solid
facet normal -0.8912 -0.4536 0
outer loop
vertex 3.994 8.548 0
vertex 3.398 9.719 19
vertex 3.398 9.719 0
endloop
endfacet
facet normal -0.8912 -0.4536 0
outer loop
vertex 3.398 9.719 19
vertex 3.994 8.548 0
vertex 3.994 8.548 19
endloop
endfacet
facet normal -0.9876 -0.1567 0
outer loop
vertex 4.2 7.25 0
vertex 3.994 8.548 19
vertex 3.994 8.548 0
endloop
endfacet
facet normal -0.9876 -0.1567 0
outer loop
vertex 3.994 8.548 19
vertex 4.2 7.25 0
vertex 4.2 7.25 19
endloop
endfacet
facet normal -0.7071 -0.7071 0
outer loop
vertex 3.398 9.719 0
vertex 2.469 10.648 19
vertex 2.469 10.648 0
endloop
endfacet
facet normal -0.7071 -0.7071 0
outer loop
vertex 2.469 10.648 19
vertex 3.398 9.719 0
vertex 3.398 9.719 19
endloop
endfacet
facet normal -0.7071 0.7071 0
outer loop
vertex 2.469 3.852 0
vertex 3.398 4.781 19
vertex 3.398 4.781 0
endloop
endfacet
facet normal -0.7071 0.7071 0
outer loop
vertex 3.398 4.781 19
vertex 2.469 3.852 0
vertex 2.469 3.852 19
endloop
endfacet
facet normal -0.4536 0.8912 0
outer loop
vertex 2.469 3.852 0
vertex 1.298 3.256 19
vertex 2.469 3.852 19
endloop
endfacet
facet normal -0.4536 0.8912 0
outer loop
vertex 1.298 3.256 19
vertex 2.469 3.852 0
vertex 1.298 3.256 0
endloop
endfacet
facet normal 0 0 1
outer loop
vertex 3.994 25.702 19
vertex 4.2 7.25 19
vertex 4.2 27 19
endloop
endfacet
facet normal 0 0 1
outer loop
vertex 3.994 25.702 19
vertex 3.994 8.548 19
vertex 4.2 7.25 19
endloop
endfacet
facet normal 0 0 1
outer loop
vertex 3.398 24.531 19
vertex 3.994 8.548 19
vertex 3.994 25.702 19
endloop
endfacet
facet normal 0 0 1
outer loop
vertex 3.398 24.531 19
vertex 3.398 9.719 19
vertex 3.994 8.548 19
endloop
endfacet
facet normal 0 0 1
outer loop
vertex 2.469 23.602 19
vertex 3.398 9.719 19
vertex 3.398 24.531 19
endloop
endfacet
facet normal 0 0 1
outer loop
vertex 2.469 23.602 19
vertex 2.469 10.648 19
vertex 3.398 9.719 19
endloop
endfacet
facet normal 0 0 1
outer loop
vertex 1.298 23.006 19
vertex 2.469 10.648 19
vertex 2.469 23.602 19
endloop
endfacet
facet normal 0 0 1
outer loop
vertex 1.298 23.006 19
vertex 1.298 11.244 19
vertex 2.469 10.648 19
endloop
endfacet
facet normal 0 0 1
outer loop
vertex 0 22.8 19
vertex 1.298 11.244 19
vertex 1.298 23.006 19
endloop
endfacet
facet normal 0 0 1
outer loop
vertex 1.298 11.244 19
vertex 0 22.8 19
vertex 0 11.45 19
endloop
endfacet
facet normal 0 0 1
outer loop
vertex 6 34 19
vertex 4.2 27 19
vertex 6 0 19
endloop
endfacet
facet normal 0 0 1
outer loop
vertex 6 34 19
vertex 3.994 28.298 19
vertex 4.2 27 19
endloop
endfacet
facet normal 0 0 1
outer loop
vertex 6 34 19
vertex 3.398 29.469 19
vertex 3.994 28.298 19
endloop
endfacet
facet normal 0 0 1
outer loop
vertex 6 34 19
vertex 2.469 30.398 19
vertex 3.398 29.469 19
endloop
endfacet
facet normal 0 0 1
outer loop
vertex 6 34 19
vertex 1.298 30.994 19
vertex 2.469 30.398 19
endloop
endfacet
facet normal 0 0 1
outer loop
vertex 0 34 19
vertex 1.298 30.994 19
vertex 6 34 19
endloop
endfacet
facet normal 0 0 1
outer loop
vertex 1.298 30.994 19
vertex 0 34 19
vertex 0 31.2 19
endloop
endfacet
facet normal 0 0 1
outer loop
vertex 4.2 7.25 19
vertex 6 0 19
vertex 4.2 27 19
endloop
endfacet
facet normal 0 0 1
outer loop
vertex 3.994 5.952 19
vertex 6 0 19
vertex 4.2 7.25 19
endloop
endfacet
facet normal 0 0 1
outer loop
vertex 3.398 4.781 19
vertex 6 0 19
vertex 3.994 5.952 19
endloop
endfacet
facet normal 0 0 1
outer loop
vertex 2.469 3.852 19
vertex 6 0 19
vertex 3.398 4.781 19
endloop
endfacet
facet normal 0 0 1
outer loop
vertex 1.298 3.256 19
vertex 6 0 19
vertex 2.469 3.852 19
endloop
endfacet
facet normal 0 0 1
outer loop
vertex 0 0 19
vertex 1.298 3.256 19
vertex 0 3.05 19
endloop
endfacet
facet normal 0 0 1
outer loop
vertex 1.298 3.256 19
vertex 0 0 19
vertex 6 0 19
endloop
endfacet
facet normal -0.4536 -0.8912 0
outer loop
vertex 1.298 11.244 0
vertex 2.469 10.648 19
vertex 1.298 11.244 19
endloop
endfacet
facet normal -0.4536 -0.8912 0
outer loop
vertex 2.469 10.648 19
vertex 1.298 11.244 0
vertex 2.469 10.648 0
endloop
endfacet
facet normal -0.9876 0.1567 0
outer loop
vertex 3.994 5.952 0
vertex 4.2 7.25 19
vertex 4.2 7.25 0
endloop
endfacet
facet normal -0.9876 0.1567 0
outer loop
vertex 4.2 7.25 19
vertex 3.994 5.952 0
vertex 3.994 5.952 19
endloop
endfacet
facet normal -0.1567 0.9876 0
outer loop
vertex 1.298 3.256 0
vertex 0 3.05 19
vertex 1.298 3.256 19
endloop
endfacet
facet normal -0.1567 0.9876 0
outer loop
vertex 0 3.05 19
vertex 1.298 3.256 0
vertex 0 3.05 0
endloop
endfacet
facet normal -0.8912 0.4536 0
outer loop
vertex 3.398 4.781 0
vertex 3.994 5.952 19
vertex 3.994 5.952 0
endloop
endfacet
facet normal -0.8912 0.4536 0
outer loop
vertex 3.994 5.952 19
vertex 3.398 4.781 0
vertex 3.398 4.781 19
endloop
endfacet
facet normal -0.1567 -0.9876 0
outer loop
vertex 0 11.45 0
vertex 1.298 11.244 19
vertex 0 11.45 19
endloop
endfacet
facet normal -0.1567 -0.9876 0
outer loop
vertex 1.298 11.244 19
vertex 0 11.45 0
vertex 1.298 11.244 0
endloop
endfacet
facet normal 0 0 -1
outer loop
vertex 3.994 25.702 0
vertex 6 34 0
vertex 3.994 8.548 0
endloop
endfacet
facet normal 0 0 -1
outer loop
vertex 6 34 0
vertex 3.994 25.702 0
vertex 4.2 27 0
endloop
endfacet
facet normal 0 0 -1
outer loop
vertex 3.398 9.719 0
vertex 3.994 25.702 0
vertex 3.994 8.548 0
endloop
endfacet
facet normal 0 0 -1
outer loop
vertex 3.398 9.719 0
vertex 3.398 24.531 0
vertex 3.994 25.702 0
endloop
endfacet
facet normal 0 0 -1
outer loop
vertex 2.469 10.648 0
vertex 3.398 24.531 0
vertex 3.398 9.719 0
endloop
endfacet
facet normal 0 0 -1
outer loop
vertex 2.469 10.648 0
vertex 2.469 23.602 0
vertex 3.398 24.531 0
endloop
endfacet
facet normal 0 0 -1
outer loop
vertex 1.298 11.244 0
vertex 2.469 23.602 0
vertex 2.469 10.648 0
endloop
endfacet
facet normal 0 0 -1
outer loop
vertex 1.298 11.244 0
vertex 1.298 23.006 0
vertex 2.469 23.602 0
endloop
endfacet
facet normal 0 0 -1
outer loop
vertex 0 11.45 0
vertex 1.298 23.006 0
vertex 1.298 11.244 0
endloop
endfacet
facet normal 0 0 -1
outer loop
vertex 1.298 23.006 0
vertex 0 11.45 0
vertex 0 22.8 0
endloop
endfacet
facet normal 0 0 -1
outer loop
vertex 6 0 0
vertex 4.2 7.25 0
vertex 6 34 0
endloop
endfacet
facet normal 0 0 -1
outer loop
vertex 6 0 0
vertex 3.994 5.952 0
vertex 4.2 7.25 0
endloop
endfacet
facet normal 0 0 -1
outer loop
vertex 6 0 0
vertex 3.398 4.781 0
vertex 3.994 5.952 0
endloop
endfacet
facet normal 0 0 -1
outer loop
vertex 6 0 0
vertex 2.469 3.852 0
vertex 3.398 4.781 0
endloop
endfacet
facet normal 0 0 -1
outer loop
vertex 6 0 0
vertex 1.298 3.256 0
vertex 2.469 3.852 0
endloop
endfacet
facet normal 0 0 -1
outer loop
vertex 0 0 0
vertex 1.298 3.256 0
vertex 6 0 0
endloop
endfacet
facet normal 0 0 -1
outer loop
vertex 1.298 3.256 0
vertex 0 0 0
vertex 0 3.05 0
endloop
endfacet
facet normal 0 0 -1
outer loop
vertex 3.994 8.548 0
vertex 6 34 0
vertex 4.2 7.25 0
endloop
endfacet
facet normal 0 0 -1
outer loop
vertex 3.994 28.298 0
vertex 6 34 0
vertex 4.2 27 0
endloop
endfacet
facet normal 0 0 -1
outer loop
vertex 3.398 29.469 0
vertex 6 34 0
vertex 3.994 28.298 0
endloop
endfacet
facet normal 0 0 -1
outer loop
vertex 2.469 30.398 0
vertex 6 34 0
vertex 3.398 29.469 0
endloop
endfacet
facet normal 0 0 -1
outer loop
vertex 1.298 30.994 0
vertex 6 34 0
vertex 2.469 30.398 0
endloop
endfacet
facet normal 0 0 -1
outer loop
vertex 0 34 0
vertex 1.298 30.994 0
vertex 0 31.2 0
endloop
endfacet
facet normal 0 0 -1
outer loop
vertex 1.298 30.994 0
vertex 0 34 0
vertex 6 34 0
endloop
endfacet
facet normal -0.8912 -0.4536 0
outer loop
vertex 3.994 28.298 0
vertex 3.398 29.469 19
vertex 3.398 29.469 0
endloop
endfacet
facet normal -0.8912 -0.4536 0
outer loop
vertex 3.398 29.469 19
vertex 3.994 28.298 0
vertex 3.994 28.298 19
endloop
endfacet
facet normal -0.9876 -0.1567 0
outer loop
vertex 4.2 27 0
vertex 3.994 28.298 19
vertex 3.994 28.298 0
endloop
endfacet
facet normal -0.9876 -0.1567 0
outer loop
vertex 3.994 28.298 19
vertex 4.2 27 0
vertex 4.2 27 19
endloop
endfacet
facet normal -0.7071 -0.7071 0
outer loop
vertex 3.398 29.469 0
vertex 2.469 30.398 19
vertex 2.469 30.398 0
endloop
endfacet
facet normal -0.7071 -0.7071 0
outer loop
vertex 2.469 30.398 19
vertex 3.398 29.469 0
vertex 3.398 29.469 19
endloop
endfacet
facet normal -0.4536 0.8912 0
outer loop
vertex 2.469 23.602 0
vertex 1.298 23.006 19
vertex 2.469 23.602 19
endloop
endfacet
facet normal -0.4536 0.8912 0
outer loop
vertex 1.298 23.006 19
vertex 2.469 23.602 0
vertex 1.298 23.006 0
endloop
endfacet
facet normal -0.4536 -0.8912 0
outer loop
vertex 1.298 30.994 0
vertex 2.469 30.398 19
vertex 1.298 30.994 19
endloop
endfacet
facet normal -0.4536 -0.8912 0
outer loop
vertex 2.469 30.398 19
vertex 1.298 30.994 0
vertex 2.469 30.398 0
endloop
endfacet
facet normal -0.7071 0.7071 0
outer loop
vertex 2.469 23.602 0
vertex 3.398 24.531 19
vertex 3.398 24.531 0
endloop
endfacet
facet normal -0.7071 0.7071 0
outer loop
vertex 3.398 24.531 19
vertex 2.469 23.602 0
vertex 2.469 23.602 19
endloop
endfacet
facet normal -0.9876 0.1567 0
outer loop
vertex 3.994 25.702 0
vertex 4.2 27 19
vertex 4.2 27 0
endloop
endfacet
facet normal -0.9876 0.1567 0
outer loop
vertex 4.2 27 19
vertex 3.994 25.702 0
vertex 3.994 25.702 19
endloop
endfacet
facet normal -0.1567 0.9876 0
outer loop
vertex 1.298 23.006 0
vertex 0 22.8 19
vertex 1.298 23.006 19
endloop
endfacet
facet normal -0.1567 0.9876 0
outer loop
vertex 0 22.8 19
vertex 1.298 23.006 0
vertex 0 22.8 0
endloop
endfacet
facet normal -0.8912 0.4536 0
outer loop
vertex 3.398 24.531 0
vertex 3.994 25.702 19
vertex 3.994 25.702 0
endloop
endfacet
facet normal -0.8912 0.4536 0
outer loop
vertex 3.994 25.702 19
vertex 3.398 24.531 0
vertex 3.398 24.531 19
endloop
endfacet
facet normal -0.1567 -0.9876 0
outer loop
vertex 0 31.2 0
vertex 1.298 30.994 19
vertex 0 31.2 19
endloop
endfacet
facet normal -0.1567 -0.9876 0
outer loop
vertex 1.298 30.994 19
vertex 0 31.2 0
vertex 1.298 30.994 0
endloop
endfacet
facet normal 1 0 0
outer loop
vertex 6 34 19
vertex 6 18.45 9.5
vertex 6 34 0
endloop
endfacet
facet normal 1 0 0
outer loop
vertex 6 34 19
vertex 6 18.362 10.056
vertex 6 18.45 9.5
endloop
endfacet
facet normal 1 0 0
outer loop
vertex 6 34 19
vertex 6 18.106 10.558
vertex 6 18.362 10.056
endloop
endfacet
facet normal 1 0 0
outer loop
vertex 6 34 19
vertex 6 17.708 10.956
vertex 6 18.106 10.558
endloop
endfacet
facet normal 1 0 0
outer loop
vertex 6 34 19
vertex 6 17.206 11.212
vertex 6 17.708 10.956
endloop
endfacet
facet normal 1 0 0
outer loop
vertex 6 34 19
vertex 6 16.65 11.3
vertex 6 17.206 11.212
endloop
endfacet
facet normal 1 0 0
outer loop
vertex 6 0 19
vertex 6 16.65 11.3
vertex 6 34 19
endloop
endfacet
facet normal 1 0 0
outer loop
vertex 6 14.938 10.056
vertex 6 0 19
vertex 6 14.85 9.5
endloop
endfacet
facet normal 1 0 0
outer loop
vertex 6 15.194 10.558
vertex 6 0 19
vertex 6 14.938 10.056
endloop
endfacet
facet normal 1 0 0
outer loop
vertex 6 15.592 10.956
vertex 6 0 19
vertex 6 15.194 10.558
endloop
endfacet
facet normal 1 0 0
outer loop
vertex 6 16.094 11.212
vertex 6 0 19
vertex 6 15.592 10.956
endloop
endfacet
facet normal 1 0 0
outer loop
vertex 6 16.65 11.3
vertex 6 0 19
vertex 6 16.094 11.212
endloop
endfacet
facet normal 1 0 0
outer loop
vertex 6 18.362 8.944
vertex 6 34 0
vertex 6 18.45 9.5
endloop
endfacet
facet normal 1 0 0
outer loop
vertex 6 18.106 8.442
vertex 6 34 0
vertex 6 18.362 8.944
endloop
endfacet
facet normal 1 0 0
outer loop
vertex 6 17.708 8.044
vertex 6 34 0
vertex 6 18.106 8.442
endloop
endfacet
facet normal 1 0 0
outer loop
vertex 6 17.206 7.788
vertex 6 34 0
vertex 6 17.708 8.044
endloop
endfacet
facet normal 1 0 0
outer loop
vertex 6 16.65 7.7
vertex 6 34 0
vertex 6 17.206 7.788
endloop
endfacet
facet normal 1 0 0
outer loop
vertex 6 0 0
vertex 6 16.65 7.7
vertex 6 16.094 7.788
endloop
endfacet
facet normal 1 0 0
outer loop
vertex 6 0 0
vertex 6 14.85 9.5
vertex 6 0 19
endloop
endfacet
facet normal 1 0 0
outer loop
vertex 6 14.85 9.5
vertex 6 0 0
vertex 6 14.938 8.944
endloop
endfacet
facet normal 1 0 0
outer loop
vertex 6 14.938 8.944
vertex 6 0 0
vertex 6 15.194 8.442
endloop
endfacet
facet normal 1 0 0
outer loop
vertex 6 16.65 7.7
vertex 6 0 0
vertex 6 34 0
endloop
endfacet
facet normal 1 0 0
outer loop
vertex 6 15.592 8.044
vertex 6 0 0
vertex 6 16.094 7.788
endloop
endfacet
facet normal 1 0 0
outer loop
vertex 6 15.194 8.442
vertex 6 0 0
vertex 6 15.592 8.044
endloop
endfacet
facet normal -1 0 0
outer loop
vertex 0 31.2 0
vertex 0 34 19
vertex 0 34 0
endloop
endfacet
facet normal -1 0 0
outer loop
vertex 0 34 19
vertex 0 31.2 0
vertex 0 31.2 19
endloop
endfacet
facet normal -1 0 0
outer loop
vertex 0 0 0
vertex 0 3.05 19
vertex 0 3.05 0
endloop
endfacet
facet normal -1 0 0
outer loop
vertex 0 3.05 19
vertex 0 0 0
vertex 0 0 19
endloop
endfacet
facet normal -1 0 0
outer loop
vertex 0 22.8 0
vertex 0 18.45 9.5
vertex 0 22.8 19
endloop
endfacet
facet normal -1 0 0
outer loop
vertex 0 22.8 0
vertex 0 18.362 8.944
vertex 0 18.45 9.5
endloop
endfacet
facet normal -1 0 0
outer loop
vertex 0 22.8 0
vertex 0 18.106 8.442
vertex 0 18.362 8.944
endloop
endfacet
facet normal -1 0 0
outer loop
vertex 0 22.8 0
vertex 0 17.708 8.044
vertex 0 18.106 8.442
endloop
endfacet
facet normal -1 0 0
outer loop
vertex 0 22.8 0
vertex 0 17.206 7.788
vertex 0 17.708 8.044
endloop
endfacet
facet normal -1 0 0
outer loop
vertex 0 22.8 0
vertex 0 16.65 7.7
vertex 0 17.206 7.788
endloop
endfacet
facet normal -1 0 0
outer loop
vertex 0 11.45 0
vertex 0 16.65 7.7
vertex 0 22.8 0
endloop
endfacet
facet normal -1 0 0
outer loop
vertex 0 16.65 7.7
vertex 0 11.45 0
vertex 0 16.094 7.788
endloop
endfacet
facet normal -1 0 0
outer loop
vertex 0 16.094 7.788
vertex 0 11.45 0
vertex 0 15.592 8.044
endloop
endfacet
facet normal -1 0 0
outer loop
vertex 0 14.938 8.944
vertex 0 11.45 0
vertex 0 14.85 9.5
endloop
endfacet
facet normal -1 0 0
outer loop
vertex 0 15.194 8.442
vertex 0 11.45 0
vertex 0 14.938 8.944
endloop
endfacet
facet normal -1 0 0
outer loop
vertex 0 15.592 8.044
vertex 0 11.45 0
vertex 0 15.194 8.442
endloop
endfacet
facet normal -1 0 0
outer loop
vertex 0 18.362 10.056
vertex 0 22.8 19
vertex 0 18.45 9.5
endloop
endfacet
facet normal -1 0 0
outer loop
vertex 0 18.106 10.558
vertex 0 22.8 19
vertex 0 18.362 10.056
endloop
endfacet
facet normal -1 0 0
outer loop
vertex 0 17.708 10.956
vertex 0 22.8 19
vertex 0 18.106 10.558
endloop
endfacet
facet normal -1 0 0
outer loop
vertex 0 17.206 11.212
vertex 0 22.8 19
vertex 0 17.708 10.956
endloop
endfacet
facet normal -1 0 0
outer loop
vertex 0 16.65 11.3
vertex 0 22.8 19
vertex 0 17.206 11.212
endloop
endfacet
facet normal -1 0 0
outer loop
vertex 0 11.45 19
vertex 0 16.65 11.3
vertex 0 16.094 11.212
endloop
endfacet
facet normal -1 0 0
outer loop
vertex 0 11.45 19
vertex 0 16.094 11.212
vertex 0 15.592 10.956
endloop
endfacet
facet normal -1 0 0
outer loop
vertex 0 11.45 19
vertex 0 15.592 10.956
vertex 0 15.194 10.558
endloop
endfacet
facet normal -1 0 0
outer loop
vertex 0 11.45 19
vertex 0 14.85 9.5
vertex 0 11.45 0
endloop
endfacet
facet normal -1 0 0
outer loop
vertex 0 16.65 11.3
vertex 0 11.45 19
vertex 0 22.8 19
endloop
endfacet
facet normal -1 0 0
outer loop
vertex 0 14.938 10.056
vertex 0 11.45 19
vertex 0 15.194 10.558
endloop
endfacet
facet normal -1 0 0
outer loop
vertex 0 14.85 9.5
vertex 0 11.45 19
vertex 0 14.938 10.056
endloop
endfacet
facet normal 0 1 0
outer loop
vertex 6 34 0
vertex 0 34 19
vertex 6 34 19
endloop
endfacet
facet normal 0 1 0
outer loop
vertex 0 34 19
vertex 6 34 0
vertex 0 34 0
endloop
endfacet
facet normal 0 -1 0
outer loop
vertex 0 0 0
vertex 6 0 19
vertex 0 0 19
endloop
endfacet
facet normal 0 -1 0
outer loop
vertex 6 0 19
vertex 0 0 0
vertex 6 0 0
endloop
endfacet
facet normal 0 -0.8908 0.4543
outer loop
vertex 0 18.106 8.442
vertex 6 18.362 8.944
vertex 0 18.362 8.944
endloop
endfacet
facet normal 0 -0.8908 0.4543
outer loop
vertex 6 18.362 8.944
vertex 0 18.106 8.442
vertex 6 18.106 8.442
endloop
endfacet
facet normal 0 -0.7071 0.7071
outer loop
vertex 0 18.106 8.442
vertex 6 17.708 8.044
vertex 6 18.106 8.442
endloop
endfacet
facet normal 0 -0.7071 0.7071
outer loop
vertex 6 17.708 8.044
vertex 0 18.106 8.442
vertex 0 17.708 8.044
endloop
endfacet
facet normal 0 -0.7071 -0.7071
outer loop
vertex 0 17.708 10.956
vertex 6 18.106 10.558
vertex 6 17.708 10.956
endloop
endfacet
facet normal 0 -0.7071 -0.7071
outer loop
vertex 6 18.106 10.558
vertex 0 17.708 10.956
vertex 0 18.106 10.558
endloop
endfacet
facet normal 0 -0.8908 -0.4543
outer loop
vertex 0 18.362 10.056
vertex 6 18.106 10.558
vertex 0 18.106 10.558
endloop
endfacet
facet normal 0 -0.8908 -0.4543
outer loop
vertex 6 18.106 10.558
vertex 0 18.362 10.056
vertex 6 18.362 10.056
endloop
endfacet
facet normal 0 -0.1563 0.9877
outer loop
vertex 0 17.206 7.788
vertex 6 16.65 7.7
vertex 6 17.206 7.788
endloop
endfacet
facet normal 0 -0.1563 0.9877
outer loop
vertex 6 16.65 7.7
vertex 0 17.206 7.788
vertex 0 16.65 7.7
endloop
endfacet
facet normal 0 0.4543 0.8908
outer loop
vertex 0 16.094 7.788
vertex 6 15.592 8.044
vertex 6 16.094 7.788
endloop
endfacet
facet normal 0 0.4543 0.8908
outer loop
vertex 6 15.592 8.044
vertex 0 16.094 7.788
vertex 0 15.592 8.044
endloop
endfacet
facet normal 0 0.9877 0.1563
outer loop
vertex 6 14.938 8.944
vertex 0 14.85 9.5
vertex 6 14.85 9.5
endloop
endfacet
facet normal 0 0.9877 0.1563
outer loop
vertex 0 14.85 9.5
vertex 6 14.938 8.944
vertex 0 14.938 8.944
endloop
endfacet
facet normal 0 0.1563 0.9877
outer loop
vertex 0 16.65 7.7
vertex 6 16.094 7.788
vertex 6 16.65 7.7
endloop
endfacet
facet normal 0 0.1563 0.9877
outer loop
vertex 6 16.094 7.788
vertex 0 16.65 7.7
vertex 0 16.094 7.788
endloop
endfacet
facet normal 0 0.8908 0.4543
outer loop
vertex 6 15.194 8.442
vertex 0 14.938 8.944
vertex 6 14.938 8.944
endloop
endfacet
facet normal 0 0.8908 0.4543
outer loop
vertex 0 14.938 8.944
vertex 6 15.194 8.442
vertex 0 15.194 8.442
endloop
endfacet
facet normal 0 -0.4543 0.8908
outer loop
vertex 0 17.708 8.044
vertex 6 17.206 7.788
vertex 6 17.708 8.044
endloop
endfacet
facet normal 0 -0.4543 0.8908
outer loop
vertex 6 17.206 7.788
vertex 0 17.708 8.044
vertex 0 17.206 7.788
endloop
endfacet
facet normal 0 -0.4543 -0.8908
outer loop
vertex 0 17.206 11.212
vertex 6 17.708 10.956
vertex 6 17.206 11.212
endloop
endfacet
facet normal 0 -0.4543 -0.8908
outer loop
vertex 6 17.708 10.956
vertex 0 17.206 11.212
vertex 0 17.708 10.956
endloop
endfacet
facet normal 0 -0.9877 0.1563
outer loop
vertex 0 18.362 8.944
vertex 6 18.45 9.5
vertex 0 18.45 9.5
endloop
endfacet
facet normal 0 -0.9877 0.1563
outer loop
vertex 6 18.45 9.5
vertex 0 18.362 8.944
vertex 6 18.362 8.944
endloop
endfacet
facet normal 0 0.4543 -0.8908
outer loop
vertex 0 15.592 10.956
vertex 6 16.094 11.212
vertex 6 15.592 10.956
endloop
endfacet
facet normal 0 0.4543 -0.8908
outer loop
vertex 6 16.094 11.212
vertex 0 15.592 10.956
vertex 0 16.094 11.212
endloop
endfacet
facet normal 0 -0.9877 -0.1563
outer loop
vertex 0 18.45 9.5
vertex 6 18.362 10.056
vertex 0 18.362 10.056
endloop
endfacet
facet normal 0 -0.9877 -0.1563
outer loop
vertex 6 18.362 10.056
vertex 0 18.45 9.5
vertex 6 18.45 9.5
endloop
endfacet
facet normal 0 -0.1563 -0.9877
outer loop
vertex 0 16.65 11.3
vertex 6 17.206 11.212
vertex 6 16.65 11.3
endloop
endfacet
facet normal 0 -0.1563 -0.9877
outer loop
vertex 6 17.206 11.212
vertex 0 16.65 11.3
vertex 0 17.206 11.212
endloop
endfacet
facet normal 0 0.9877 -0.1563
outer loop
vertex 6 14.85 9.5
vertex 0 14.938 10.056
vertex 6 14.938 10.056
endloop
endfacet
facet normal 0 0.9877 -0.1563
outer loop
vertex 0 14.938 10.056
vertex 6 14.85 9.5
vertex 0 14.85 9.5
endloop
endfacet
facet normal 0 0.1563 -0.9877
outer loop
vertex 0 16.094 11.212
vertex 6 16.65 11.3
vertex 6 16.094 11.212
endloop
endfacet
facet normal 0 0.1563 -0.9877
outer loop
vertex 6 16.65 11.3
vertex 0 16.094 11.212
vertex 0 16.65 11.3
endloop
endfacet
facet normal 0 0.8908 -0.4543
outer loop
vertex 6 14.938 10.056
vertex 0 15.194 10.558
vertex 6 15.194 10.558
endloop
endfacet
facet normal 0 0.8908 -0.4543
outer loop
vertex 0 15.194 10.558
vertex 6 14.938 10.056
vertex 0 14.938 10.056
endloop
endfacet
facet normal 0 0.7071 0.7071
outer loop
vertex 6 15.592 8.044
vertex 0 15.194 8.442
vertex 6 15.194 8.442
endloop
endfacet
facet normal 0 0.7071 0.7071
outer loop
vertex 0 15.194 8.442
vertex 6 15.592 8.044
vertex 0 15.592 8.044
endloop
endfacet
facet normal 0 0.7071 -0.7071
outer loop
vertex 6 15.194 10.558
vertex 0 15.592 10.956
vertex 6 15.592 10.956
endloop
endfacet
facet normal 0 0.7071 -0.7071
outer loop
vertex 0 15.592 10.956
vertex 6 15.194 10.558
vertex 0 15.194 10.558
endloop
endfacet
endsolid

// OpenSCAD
difference(){
difference(){
    cube([6,34,19]);
    for (i = [7.25:19.75:7.25+19.75]){
        translate([0,i,0])
        cylinder(19,4.2,4.2, $fn=20);
    }
}
translate([0,16.65,9.5]) rotate([0,90,0]) cylinder(8,1.8,1.8, $fn=20);
}
